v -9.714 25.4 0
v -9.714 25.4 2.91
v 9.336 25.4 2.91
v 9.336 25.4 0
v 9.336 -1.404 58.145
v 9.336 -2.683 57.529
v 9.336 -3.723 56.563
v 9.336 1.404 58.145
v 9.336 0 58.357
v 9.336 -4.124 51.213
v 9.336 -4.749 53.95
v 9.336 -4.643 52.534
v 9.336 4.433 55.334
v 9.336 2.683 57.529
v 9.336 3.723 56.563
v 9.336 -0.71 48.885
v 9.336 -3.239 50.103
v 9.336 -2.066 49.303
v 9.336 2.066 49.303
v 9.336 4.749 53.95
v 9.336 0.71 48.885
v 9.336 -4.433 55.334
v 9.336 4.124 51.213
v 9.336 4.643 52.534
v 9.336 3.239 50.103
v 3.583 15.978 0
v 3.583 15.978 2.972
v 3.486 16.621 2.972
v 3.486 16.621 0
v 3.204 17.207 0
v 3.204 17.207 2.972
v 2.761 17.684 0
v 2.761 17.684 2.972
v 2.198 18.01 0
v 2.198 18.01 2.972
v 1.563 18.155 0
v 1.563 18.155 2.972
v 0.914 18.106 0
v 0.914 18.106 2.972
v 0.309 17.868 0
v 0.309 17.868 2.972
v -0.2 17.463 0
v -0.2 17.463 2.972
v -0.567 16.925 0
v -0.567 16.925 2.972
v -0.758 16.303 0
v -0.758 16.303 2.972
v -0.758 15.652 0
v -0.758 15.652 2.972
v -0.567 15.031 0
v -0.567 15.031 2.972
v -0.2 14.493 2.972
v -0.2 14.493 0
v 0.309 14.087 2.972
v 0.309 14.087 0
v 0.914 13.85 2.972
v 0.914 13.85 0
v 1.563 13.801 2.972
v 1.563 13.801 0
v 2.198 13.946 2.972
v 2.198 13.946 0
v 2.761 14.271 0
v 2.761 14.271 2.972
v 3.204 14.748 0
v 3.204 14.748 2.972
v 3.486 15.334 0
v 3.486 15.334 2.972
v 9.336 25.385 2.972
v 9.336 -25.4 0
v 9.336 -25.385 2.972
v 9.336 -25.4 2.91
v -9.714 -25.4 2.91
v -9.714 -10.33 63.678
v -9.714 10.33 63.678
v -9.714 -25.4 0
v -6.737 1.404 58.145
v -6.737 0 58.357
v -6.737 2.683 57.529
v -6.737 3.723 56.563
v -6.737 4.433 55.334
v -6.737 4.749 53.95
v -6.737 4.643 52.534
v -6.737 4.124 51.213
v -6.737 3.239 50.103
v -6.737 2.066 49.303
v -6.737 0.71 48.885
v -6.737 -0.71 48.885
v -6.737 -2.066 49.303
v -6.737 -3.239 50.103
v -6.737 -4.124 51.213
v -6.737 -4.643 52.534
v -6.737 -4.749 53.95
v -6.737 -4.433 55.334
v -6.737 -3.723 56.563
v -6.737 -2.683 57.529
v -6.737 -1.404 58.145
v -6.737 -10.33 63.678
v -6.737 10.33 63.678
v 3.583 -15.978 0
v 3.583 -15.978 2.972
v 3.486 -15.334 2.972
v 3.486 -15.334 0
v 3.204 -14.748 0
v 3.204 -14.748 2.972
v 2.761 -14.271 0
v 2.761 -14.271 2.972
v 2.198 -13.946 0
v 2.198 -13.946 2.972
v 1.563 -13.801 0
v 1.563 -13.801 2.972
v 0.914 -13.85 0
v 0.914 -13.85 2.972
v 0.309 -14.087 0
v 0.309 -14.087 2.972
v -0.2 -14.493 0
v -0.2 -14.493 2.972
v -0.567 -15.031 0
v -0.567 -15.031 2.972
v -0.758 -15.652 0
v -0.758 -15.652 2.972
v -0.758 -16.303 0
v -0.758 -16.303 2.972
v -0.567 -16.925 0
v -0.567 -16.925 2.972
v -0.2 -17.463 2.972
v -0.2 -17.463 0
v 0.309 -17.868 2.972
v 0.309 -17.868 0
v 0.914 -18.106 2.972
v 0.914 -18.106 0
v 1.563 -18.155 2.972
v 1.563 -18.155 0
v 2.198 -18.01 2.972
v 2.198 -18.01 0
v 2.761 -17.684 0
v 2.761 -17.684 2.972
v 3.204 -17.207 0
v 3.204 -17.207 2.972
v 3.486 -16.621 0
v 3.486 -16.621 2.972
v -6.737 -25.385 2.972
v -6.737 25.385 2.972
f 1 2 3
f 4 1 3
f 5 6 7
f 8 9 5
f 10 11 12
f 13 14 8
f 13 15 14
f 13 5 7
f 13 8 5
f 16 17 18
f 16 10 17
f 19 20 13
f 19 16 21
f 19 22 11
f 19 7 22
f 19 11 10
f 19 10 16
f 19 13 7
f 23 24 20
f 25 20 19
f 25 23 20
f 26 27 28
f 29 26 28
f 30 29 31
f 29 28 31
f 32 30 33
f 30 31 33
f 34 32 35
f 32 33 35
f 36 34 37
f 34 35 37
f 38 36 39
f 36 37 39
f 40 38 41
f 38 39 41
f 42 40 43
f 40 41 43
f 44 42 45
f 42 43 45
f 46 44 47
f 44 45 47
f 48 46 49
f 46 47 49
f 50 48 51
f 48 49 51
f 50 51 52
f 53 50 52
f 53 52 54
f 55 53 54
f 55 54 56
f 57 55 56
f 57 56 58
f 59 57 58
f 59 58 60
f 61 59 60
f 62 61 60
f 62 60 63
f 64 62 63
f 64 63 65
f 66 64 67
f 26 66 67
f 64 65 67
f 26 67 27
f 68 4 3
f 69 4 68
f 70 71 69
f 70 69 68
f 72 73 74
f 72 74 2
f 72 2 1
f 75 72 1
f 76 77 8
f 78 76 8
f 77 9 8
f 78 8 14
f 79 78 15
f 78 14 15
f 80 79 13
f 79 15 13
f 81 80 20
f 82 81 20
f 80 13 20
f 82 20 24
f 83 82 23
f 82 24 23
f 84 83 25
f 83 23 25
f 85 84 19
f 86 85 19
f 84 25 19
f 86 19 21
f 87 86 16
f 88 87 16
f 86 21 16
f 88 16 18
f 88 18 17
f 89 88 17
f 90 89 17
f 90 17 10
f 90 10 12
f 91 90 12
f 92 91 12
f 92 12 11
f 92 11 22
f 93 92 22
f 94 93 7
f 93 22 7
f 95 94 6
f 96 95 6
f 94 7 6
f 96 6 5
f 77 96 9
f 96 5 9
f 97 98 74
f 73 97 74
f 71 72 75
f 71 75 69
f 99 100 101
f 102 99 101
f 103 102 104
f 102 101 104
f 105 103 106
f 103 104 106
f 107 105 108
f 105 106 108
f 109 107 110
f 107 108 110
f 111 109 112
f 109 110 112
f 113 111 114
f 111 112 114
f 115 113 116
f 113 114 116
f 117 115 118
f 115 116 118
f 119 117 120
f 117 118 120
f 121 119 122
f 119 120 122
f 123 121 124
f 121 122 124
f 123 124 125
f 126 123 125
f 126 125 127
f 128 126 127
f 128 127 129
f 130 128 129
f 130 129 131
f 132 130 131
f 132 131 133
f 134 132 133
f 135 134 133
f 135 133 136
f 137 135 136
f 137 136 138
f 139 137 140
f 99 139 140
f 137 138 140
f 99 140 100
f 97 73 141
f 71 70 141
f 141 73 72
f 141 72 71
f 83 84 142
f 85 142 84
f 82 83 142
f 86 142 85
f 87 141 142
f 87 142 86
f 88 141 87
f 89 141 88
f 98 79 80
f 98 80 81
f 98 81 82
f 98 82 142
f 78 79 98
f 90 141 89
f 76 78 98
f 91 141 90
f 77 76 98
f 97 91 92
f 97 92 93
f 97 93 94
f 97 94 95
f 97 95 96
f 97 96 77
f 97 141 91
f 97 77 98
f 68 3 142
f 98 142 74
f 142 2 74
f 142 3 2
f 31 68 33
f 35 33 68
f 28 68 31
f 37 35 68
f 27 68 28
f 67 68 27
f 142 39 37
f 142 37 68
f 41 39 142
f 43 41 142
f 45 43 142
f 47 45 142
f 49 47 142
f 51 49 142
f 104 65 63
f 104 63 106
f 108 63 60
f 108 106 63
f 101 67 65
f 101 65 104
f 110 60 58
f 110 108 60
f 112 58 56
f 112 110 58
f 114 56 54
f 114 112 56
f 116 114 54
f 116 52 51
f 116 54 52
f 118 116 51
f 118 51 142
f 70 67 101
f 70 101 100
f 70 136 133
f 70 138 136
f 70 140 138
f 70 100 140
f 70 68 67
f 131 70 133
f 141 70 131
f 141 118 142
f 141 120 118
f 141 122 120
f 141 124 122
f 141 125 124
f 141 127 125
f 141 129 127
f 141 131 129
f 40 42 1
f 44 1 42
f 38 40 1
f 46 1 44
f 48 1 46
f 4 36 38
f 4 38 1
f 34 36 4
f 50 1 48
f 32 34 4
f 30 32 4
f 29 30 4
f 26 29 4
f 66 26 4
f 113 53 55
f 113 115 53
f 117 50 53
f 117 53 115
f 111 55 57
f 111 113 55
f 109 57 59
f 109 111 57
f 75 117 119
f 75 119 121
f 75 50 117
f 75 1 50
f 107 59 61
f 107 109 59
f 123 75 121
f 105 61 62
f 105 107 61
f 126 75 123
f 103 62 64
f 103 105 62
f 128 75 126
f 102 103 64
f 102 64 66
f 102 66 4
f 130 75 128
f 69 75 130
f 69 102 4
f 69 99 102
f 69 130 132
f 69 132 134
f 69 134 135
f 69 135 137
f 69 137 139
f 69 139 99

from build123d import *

# Parameters (mm, degrees)
F1_DEPTH = 25.4
F0_W     = 16.073438
F0_H     = 4.7625
F3_R     = 2.182813
F4_DEPTH = 2.9718
F6_DEPTH = 19.051


with BuildPart() as f1:
    # F0 (on Front) → F1 (new body, symmetric)
    with BuildSketch(Plane.XZ):
        Polygon((-6.737426, 63.6778), (-9.713988, 63.6778), (-9.713988, 0), (9.336012, 0), (9.336012, 2.9718), (-6.737426, 2.9718), (-6.737426, 48.8315), (-6.737426, 53.594), (-6.737426, 58.3565), align=None)
    extrude(amount=F1_DEPTH, both=True)

    # F0 (on Front) → F2 (revolve)
    with BuildSketch(Plane.XZ):
        with Locations((1.299293, 55.97525)):
            Rectangle(F0_W, F0_H)
    revolve(axis=Axis((1.299293, 0, 53.594), (-1, 0, 0)))

    # F3 (on face) → F4 (cut, through all)
    with BuildSketch(Plane.XY.offset(2.9718)):
        with Locations((1.400099, 15.977813)):
            Circle(F3_R)
        with Locations((1.400099, -15.977813)):
            Circle(F3_R)
    extrude(amount=-F4_DEPTH, mode=Mode.SUBTRACT)

    # F5 (on face) → F6 (cut, through all)
    with BuildSketch(Plane(origin=(-9.713988, 0, 0), x_dir=(0, -1, 0), z_dir=(-1, 0, 0))):
        Polygon((25.4, 63.6778), (10.33, 63.6778), (25.4, 2.91), align=None)
        Polygon((-25.4, 2.91), (-10.33, 63.6778), (-25.4, 63.6778), align=None)
    extrude(amount=-F6_DEPTH, mode=Mode.SUBTRACT)


solid = f1.part
